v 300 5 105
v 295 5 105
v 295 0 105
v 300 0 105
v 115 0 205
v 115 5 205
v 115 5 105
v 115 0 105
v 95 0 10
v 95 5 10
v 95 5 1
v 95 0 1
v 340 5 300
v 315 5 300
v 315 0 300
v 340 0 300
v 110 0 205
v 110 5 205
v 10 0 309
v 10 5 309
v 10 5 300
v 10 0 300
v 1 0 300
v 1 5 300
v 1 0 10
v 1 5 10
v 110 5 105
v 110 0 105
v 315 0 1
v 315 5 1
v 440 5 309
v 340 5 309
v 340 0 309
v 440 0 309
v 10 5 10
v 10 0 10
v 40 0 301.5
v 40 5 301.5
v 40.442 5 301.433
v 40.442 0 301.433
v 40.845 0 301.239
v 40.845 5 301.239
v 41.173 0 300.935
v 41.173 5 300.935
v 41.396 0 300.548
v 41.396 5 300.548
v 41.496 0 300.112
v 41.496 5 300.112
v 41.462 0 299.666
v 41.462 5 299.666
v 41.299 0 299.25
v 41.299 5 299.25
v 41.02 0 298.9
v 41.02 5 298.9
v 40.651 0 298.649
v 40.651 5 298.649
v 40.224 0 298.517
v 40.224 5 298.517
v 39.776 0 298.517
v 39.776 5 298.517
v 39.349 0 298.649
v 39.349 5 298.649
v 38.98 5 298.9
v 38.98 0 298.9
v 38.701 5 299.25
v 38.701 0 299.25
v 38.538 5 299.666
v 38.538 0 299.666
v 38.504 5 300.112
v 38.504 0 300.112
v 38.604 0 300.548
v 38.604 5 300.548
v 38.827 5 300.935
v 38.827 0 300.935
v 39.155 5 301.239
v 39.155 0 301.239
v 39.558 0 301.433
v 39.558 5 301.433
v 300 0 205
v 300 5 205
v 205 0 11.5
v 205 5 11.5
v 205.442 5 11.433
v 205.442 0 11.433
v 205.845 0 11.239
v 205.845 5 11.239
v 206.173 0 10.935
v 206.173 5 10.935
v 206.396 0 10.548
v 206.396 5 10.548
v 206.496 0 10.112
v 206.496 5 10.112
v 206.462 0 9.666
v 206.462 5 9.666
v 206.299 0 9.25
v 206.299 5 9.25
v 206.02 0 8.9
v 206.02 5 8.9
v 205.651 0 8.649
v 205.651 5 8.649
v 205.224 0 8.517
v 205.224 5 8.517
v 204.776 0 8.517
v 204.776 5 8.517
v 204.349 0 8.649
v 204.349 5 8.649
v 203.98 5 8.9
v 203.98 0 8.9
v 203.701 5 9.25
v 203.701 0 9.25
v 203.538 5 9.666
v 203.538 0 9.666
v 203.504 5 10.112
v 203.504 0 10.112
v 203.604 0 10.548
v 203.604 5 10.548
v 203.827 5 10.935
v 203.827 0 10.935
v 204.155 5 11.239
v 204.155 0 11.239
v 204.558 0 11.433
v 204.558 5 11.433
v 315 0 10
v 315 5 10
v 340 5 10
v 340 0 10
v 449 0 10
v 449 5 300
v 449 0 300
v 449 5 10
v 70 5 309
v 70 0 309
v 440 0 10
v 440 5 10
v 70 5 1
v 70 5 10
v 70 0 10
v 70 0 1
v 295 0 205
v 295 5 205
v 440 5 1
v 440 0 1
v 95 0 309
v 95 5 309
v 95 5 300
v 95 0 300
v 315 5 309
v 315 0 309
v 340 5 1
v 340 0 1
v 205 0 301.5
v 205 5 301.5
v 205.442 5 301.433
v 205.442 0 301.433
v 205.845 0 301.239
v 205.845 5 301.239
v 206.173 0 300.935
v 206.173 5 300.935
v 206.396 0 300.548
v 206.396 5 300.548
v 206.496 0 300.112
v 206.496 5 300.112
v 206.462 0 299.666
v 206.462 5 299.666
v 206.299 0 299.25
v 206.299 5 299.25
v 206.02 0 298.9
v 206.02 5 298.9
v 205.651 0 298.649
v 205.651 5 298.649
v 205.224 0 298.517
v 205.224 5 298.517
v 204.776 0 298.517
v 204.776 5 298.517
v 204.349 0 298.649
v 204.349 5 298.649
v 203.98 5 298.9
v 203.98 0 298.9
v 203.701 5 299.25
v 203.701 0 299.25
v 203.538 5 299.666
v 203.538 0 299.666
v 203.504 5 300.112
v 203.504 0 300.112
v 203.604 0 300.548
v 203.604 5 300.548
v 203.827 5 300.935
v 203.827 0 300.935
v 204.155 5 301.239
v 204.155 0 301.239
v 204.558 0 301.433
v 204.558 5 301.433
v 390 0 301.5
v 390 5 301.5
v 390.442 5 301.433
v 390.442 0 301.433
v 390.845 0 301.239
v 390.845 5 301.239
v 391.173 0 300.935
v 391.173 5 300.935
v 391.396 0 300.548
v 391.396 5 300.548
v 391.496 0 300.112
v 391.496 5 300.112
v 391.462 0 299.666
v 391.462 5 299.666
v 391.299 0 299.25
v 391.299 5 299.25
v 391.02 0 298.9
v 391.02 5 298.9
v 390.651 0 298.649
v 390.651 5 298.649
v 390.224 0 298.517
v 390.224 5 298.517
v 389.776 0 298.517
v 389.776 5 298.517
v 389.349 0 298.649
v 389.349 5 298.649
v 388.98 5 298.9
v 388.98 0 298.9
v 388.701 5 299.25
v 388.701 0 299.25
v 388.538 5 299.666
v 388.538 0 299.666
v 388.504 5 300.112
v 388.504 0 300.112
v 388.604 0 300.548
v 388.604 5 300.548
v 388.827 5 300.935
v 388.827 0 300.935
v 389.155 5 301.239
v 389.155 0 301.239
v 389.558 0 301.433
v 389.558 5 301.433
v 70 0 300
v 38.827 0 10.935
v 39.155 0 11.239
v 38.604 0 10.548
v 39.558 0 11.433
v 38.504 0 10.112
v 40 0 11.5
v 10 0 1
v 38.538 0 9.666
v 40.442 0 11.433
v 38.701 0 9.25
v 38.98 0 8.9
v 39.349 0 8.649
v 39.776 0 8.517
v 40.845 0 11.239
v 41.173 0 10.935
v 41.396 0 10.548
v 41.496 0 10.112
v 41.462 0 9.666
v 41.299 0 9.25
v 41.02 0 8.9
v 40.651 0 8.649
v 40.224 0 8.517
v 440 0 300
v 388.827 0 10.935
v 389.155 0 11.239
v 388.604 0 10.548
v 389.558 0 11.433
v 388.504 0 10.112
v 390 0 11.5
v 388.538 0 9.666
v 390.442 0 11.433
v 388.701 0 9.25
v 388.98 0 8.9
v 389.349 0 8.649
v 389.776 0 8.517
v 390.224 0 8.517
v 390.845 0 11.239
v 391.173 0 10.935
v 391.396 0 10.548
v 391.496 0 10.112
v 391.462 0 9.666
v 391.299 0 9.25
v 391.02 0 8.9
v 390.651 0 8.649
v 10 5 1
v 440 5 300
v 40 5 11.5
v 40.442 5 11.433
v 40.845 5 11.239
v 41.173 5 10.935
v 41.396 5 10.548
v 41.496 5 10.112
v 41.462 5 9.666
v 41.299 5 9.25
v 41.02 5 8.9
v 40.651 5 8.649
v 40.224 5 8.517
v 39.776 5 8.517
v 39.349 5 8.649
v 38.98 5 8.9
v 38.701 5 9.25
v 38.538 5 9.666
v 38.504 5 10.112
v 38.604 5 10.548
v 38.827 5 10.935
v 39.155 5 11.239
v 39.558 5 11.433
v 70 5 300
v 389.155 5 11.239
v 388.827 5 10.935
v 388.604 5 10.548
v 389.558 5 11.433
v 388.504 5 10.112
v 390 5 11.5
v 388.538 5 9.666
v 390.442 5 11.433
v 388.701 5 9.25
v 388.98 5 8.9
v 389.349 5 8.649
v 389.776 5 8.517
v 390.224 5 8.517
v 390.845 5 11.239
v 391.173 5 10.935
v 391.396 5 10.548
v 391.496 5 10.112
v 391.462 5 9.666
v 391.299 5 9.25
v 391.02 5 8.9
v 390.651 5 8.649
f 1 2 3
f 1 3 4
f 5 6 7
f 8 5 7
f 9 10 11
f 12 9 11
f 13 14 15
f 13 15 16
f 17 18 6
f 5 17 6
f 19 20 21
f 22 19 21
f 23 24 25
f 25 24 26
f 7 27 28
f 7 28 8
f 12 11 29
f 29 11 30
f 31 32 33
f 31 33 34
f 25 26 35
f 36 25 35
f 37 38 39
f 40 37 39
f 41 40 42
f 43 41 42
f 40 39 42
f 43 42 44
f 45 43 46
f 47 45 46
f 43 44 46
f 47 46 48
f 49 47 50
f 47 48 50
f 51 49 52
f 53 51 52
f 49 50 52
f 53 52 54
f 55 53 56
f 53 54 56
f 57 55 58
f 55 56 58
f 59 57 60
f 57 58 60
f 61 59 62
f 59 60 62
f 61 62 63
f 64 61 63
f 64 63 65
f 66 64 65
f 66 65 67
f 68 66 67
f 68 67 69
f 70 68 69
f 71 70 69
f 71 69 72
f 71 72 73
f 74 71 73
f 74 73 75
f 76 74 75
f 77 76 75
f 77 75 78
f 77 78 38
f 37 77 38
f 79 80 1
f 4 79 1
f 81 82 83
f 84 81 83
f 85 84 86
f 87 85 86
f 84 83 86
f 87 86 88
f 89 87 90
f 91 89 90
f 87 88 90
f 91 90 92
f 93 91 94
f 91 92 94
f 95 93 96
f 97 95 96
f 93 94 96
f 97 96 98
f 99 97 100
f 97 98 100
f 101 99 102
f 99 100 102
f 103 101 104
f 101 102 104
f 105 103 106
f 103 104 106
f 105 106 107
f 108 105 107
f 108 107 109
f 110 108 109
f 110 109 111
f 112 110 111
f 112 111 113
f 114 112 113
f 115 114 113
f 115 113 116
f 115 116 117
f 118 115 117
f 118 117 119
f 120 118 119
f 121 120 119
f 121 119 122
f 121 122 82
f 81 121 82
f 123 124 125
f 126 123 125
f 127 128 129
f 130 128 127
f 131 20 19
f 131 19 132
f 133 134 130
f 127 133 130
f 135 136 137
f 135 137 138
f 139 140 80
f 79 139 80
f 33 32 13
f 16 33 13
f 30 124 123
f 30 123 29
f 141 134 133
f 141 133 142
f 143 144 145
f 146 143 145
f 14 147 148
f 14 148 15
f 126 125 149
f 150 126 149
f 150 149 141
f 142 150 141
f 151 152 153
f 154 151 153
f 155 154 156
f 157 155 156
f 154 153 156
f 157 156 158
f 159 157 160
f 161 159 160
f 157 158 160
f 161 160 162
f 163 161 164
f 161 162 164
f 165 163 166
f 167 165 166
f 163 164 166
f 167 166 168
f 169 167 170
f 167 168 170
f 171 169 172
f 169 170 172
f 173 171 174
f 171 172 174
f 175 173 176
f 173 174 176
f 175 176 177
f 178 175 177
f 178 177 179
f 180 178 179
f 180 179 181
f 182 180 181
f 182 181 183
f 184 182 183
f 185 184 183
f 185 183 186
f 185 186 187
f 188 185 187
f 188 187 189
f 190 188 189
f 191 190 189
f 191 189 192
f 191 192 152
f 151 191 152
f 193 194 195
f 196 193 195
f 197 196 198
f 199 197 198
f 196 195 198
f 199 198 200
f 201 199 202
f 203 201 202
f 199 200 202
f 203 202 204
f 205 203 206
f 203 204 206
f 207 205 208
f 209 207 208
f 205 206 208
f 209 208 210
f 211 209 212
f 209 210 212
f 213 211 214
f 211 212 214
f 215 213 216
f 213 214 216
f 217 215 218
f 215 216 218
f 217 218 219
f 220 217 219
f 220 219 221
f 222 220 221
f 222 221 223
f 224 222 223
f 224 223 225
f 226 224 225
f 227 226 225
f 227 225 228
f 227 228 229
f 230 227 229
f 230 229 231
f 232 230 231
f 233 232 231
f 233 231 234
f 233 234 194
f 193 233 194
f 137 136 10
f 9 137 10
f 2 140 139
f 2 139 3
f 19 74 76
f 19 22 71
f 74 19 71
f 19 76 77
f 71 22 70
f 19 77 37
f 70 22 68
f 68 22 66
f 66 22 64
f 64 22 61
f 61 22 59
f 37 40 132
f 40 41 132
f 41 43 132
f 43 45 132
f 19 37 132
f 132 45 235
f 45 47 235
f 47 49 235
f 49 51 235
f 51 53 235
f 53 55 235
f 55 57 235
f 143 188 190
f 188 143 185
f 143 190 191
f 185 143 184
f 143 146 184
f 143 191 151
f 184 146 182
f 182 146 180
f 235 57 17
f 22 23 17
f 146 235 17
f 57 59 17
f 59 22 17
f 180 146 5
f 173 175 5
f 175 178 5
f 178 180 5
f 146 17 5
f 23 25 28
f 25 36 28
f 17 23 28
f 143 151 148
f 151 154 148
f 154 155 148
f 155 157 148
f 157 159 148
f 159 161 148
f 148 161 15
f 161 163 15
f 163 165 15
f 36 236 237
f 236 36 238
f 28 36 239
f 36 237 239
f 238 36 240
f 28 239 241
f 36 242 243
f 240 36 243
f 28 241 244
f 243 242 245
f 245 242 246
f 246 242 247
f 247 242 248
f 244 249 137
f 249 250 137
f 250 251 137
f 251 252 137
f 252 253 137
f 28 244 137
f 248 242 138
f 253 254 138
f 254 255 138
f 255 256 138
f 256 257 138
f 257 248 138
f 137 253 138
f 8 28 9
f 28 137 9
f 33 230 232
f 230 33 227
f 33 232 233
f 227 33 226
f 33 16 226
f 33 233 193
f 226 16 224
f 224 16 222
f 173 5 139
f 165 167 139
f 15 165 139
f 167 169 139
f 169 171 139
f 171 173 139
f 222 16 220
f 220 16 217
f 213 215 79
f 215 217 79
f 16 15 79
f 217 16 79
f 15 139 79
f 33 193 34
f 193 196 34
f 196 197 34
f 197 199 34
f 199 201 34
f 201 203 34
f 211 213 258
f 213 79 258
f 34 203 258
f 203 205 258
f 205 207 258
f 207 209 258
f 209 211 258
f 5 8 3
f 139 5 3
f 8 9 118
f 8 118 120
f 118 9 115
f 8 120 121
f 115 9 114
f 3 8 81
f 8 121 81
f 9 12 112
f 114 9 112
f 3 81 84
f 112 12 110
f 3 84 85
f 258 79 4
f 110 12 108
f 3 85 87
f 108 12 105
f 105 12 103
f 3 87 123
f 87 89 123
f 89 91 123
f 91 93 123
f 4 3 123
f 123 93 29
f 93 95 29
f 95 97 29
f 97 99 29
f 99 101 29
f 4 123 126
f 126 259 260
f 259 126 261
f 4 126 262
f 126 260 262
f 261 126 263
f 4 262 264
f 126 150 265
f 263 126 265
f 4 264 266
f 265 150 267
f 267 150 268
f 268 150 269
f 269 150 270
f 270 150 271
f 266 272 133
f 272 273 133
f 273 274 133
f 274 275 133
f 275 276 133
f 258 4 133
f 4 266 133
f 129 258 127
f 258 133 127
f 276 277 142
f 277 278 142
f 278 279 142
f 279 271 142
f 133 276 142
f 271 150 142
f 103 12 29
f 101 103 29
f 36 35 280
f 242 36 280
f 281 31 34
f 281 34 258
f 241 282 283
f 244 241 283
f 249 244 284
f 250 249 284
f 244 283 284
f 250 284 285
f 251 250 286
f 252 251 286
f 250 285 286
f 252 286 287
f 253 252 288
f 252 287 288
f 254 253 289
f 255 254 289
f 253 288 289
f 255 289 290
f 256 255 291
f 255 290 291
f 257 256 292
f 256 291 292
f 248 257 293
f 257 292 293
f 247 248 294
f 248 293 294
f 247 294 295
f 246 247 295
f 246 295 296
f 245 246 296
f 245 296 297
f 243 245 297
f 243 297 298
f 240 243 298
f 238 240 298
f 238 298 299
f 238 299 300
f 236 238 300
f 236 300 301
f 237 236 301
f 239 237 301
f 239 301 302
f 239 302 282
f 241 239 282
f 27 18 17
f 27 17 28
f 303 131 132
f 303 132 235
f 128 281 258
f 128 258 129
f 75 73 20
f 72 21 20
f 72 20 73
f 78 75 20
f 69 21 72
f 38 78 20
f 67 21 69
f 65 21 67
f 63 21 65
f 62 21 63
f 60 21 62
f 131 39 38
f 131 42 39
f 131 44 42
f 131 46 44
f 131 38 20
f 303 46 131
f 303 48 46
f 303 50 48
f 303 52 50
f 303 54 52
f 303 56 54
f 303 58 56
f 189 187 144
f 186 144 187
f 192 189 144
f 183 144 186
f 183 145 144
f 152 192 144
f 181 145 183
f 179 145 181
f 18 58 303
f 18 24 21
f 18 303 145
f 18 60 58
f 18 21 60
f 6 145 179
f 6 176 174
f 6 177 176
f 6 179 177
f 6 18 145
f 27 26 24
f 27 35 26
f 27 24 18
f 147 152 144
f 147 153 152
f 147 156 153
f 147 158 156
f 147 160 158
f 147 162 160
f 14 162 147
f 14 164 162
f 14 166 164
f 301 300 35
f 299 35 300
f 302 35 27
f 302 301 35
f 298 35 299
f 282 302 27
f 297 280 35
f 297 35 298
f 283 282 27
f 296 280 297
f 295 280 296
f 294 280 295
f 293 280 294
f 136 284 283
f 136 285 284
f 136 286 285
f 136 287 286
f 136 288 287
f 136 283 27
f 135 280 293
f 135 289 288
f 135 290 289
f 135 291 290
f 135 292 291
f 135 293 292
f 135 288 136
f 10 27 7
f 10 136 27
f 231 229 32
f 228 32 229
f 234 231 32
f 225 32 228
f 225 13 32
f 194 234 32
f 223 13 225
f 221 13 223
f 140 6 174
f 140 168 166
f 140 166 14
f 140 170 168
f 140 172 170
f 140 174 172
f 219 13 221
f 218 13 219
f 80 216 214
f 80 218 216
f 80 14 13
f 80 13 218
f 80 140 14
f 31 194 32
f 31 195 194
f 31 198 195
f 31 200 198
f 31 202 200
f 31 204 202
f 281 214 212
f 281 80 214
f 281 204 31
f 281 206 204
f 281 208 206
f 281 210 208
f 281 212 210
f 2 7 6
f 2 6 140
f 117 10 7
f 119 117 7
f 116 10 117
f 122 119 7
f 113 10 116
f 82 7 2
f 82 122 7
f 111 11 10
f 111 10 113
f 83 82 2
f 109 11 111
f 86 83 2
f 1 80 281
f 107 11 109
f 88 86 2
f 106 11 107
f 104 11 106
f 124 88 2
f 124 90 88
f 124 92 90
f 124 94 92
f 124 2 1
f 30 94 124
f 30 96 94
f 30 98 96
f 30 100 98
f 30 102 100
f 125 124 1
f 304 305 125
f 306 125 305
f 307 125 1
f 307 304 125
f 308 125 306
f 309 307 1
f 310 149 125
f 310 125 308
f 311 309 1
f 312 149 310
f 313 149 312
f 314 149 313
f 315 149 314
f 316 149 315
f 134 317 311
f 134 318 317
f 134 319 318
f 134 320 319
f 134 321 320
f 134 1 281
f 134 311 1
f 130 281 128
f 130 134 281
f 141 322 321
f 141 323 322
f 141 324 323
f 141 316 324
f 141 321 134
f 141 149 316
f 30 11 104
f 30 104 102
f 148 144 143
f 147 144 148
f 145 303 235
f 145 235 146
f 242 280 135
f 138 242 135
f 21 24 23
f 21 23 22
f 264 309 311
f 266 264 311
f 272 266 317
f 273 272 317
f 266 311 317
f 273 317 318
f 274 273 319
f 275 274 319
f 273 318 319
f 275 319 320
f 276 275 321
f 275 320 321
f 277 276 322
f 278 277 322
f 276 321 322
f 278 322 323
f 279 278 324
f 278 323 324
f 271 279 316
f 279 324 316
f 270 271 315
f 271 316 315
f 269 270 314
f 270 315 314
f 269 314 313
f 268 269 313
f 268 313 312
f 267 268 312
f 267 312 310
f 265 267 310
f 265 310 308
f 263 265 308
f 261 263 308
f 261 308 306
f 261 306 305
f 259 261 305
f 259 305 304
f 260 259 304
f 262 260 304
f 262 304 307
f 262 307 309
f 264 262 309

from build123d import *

# Parameters (mm, degrees)
SKIZZE1_W                       = 450
SKIZZE1_H                       = 310
AUFSATZ_LINEAR_AUSTRAGEN1_DEPTH = 5
SKIZZE2_W                       = 10
SKIZZE2_H                       = 10
SKIZZE2_W_2                     = 25
SCHNITT_LINEAR_AUSTRAGEN1_DEPTH = 547.465918425
SKIZZE3_W                       = 5
SKIZZE3_H                       = 100
SCHNITT_LINEAR_AUSTRAGEN2_DEPTH = 547.465918425
SKIZZE4_R                       = 1.5
SCHNITT_LINEAR_AUSTRAGEN3_DEPTH = 547.465918425
SKIZZE5_W                       = 2
SKIZZE5_H                       = 290
SKIZZE5_W_2                     = 60
SKIZZE5_H_2                     = 2
SKIZZE5_W_3                     = 220
SKIZZE5_W_4                     = 100
SCHNITT_LINEAR_AUSTRAGEN4_DEPTH = 547.465918425


with BuildPart() as part:
    # Skizze1 → Aufsatz-Linear austragen1 (new body)
    with BuildSketch(Plane(origin=(0, 0, 0), x_dir=(1, 0, 0), z_dir=(0, 1, 0))):
        with Locations((225, -155)):
            Rectangle(SKIZZE1_W, SKIZZE1_H)
    extrude(amount=AUFSATZ_LINEAR_AUSTRAGEN1_DEPTH)

    # Skizze2 → Schnitt-Linear austragen1 (cut, through all)
    with BuildSketch(Plane(origin=(0, 5, 0), x_dir=(1, 0, 0), z_dir=(0, 1, 0))):
        with Locations((5, -5)):
            Rectangle(SKIZZE2_W, SKIZZE2_H)
        with Locations((445, -305)):
            Rectangle(SKIZZE2_W, SKIZZE2_H)
        with Locations((445, -5)):
            Rectangle(SKIZZE2_W, SKIZZE2_H)
        with Locations((5, -305)):
            Rectangle(SKIZZE2_W, SKIZZE2_H)
        with Locations((82.5, -5)):
            Rectangle(SKIZZE2_W_2, SKIZZE2_H)
        with Locations((327.5, -5)):
            Rectangle(SKIZZE2_W_2, SKIZZE2_H)
        with Locations((327.5, -305)):
            Rectangle(SKIZZE2_W_2, SKIZZE2_H)
        with Locations((82.5, -305)):
            Rectangle(SKIZZE2_W_2, SKIZZE2_H)
    extrude(amount=-SCHNITT_LINEAR_AUSTRAGEN1_DEPTH, mode=Mode.SUBTRACT)

    # Skizze3 → Schnitt-Linear austragen2 (cut, through all)
    with BuildSketch(Plane(origin=(0, 5, 0), x_dir=(1, 0, 0), z_dir=(0, 1, 0))):
        with Locations((112.5, -155)):
            Rectangle(SKIZZE3_W, SKIZZE3_H)
        with Locations((297.5, -155)):
            Rectangle(SKIZZE3_W, SKIZZE3_H)
    extrude(amount=-SCHNITT_LINEAR_AUSTRAGEN2_DEPTH, mode=Mode.SUBTRACT)

    # Skizze4 → Schnitt-Linear austragen3 (cut, through all)
    with BuildSketch(Plane(origin=(0, 5, 0), x_dir=(1, 0, 0), z_dir=(0, 1, 0))):
        with Locations(Location((40, -10, 0), (0, 0, 270))):
            Circle(SKIZZE4_R)
        with Locations(Location((205, -10, 0), (0, 0, 270))):
            Circle(SKIZZE4_R)
        with Locations(Location((390, -10, 0), (0, 0, 270))):
            Circle(SKIZZE4_R)
        with Locations(Location((40, -300, 0), (0, 0, 270))):
            Circle(SKIZZE4_R)
        with Locations(Location((205, -300, 0), (0, 0, 270))):
            Circle(SKIZZE4_R)
        with Locations(Location((390, -300, 0), (0, 0, 270))):
            Circle(SKIZZE4_R)
    extrude(amount=-SCHNITT_LINEAR_AUSTRAGEN3_DEPTH, mode=Mode.SUBTRACT)

    # Skizze5 → Schnitt-Linear austragen4 (cut, through all)
    with BuildSketch(Plane(origin=(0, 5, 0), x_dir=(1, 0, 0), z_dir=(0, 1, 0))):
        with Locations((0, -155)):
            Rectangle(SKIZZE5_W, SKIZZE5_H)
        with Locations((40, 0)):
            Rectangle(SKIZZE5_W_2, SKIZZE5_H_2)
        with Locations((205, 0)):
            Rectangle(SKIZZE5_W_3, SKIZZE5_H_2)
        with Locations((390, 0)):
            Rectangle(SKIZZE5_W_4, SKIZZE5_H_2)
        with Locations((450, -155)):
            Rectangle(SKIZZE5_W, SKIZZE5_H)
        with Locations((390, -310)):
            Rectangle(SKIZZE5_W_4, SKIZZE5_H_2)
        with Locations((205, -310)):
            Rectangle(SKIZZE5_W_3, SKIZZE5_H_2)
        with Locations((40, -310)):
            Rectangle(SKIZZE5_W_2, SKIZZE5_H_2)
    extrude(amount=-SCHNITT_LINEAR_AUSTRAGEN4_DEPTH, mode=Mode.SUBTRACT)


solid = part.part
